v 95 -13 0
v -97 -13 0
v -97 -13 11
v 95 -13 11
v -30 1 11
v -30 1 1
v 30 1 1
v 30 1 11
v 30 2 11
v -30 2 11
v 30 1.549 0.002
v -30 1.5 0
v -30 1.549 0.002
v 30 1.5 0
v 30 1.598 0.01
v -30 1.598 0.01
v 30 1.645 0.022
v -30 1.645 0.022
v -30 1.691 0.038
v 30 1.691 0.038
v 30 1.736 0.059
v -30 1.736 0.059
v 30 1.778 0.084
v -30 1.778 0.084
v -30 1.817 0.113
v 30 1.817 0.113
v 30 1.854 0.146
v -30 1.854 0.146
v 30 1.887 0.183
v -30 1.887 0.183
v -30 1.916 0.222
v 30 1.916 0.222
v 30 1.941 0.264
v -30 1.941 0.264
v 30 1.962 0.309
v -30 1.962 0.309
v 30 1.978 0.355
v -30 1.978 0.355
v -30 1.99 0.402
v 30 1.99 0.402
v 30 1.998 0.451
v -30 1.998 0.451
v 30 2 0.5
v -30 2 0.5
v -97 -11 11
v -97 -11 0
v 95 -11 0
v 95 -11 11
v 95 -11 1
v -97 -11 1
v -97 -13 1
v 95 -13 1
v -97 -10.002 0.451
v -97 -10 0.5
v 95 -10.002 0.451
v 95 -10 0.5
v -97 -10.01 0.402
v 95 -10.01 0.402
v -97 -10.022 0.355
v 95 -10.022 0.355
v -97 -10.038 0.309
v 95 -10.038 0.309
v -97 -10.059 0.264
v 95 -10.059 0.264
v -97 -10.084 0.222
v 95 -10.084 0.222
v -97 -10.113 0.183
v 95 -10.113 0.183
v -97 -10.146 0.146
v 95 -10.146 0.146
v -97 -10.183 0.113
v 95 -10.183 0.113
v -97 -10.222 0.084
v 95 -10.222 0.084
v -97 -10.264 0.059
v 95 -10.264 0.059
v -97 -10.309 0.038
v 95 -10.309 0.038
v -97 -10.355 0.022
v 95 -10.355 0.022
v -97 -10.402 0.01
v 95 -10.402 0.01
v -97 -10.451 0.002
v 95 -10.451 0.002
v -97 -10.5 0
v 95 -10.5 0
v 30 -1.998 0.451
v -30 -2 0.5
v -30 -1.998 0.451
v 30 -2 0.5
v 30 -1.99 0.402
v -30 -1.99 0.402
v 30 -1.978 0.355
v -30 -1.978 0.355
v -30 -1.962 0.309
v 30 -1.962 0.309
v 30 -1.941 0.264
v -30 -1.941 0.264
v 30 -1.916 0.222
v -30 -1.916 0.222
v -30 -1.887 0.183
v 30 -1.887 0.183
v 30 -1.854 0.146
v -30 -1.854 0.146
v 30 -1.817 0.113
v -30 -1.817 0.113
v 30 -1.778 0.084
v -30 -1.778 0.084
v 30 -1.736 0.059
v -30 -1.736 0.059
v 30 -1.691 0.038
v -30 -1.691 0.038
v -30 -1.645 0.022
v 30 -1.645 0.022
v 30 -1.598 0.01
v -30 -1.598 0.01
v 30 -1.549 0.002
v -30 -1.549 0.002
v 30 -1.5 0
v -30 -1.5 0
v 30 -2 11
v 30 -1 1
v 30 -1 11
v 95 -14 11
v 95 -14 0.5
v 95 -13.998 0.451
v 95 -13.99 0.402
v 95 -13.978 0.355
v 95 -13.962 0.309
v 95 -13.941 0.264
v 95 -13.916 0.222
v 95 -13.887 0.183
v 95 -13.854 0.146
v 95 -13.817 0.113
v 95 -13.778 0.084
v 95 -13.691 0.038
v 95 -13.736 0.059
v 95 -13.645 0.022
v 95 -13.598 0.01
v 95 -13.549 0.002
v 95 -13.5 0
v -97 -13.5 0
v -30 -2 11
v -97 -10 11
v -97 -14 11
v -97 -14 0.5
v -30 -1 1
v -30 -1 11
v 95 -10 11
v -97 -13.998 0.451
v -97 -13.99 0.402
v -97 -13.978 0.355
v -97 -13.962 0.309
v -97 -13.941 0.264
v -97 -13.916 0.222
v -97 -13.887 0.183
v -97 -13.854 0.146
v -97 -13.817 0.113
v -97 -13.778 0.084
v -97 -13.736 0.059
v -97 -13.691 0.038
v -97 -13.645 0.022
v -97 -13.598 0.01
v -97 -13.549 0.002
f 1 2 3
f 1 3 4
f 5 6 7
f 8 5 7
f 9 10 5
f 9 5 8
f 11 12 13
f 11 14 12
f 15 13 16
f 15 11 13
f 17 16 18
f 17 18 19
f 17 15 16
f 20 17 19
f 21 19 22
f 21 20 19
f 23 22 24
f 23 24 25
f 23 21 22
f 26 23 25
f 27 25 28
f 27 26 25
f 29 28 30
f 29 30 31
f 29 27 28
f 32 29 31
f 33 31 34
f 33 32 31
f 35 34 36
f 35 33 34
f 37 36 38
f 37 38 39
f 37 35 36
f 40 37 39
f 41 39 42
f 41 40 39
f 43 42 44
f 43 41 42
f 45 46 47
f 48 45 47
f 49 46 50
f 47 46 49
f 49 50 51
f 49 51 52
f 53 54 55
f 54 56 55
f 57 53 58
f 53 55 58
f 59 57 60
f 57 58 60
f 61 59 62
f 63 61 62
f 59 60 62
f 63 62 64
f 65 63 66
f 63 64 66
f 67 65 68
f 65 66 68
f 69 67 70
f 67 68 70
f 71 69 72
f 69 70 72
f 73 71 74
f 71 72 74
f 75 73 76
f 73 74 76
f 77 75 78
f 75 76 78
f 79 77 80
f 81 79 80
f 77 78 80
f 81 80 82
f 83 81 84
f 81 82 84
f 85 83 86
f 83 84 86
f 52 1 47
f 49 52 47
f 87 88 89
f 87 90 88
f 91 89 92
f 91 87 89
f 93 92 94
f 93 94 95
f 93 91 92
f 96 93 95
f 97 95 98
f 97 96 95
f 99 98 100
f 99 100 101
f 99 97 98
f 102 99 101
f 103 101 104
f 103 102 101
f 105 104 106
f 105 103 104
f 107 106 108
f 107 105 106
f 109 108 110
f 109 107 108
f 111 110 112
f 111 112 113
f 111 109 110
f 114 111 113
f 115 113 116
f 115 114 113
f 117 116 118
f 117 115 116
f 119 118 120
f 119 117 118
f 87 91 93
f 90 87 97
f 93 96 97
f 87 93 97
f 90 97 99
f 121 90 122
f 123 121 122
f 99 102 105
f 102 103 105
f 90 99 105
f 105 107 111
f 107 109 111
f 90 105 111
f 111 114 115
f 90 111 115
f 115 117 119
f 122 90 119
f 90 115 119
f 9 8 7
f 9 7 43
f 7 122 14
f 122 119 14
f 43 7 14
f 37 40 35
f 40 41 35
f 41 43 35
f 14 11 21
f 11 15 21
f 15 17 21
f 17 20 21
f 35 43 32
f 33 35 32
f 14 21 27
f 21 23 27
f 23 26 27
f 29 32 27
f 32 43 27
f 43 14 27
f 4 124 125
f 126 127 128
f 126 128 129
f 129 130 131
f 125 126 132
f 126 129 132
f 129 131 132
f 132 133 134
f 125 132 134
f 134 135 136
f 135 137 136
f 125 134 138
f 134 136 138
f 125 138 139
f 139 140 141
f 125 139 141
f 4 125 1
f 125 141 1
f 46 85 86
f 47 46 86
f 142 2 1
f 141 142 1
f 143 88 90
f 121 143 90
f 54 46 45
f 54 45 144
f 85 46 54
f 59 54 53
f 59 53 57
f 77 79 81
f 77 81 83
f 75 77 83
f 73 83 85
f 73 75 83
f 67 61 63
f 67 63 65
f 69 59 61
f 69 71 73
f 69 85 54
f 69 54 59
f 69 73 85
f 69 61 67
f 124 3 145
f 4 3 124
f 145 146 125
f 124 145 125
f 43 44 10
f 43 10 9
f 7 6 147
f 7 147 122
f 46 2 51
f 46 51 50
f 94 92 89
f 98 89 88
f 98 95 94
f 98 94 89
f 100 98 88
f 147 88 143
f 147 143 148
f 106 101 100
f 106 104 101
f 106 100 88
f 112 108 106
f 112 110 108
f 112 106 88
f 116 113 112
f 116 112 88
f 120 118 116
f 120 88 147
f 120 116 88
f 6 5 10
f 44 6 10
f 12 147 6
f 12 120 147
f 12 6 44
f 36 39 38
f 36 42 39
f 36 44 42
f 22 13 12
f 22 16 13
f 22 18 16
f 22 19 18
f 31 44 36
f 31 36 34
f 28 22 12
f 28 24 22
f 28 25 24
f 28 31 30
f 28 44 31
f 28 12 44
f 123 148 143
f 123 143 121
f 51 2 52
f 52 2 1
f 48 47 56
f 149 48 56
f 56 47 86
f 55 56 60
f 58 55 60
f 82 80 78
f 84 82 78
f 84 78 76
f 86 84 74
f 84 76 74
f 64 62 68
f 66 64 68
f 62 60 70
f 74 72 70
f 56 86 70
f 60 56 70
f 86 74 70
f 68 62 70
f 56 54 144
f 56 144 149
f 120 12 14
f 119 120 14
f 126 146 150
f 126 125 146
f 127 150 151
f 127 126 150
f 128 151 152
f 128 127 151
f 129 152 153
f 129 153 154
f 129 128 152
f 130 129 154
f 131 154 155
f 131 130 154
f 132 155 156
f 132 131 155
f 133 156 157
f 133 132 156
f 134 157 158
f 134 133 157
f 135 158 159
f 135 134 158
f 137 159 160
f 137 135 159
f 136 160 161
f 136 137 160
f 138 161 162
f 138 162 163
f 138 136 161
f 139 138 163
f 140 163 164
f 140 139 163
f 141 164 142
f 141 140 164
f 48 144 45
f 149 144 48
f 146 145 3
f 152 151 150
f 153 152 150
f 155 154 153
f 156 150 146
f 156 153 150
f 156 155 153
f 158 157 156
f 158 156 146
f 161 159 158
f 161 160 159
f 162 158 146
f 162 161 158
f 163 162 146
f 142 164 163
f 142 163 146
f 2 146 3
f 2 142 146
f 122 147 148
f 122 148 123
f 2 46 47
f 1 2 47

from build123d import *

# Parameters (mm, degrees)
F0_W     = 60
F0_H     = 4
F1_DEPTH = 1
F2_W     = 60
F2_H     = 1
F3_DEPTH = 10
F4_R     = 0.5
F5_W     = 192
F5_H     = 1
F6_DEPTH = 11
F5_H_2   = 2
F7_DEPTH = 1
F8_R     = 0.5


with BuildPart() as f1:
    # F0 (on Top) → F1 (new body)
    with BuildSketch(Plane.XY):
        Rectangle(F0_W, F0_H)
    extrude(amount=F1_DEPTH)

    # F2 (on face) → F3 (join)
    with BuildSketch(Plane.XY.offset(1)):
        with Locations((0, 1.5)):
            Rectangle(F2_W, F2_H)
        with Locations((0, -1.5)):
            Rectangle(F2_W, F2_H)
    extrude(amount=F3_DEPTH)

    # F4
    f4_edges = [f1.edges().sort_by_distance(p)[0] for p in [
        (0, -2, 0),
        (0, 2, 0),
    ]]
    fillet(f4_edges, radius=F4_R)


with BuildPart() as f6:
    # F5 (on Top) → F6 (new body)
    with BuildSketch(Plane.XY):
        with Locations((-1, -10.5)):
            Rectangle(F5_W, F5_H)
        with Locations((-1, -13.5)):
            Rectangle(F5_W, F5_H)
    extrude(amount=F6_DEPTH)

    # F8
    f8_edges = [f6.edges().sort_by_distance(p)[0] for p in [
        (-1, -14, 0),
        (-1, -10, 0),
    ]]
    fillet(f8_edges, radius=F8_R)


with BuildPart() as f7:
    # F5 (on Top) → F7 (new body)
    with BuildSketch(Plane.XY):
        with Locations((-1, -12)):
            Rectangle(F5_W, F5_H_2)
    extrude(amount=F7_DEPTH)


solid = Compound([f1.part, f6.part, f7.part])
